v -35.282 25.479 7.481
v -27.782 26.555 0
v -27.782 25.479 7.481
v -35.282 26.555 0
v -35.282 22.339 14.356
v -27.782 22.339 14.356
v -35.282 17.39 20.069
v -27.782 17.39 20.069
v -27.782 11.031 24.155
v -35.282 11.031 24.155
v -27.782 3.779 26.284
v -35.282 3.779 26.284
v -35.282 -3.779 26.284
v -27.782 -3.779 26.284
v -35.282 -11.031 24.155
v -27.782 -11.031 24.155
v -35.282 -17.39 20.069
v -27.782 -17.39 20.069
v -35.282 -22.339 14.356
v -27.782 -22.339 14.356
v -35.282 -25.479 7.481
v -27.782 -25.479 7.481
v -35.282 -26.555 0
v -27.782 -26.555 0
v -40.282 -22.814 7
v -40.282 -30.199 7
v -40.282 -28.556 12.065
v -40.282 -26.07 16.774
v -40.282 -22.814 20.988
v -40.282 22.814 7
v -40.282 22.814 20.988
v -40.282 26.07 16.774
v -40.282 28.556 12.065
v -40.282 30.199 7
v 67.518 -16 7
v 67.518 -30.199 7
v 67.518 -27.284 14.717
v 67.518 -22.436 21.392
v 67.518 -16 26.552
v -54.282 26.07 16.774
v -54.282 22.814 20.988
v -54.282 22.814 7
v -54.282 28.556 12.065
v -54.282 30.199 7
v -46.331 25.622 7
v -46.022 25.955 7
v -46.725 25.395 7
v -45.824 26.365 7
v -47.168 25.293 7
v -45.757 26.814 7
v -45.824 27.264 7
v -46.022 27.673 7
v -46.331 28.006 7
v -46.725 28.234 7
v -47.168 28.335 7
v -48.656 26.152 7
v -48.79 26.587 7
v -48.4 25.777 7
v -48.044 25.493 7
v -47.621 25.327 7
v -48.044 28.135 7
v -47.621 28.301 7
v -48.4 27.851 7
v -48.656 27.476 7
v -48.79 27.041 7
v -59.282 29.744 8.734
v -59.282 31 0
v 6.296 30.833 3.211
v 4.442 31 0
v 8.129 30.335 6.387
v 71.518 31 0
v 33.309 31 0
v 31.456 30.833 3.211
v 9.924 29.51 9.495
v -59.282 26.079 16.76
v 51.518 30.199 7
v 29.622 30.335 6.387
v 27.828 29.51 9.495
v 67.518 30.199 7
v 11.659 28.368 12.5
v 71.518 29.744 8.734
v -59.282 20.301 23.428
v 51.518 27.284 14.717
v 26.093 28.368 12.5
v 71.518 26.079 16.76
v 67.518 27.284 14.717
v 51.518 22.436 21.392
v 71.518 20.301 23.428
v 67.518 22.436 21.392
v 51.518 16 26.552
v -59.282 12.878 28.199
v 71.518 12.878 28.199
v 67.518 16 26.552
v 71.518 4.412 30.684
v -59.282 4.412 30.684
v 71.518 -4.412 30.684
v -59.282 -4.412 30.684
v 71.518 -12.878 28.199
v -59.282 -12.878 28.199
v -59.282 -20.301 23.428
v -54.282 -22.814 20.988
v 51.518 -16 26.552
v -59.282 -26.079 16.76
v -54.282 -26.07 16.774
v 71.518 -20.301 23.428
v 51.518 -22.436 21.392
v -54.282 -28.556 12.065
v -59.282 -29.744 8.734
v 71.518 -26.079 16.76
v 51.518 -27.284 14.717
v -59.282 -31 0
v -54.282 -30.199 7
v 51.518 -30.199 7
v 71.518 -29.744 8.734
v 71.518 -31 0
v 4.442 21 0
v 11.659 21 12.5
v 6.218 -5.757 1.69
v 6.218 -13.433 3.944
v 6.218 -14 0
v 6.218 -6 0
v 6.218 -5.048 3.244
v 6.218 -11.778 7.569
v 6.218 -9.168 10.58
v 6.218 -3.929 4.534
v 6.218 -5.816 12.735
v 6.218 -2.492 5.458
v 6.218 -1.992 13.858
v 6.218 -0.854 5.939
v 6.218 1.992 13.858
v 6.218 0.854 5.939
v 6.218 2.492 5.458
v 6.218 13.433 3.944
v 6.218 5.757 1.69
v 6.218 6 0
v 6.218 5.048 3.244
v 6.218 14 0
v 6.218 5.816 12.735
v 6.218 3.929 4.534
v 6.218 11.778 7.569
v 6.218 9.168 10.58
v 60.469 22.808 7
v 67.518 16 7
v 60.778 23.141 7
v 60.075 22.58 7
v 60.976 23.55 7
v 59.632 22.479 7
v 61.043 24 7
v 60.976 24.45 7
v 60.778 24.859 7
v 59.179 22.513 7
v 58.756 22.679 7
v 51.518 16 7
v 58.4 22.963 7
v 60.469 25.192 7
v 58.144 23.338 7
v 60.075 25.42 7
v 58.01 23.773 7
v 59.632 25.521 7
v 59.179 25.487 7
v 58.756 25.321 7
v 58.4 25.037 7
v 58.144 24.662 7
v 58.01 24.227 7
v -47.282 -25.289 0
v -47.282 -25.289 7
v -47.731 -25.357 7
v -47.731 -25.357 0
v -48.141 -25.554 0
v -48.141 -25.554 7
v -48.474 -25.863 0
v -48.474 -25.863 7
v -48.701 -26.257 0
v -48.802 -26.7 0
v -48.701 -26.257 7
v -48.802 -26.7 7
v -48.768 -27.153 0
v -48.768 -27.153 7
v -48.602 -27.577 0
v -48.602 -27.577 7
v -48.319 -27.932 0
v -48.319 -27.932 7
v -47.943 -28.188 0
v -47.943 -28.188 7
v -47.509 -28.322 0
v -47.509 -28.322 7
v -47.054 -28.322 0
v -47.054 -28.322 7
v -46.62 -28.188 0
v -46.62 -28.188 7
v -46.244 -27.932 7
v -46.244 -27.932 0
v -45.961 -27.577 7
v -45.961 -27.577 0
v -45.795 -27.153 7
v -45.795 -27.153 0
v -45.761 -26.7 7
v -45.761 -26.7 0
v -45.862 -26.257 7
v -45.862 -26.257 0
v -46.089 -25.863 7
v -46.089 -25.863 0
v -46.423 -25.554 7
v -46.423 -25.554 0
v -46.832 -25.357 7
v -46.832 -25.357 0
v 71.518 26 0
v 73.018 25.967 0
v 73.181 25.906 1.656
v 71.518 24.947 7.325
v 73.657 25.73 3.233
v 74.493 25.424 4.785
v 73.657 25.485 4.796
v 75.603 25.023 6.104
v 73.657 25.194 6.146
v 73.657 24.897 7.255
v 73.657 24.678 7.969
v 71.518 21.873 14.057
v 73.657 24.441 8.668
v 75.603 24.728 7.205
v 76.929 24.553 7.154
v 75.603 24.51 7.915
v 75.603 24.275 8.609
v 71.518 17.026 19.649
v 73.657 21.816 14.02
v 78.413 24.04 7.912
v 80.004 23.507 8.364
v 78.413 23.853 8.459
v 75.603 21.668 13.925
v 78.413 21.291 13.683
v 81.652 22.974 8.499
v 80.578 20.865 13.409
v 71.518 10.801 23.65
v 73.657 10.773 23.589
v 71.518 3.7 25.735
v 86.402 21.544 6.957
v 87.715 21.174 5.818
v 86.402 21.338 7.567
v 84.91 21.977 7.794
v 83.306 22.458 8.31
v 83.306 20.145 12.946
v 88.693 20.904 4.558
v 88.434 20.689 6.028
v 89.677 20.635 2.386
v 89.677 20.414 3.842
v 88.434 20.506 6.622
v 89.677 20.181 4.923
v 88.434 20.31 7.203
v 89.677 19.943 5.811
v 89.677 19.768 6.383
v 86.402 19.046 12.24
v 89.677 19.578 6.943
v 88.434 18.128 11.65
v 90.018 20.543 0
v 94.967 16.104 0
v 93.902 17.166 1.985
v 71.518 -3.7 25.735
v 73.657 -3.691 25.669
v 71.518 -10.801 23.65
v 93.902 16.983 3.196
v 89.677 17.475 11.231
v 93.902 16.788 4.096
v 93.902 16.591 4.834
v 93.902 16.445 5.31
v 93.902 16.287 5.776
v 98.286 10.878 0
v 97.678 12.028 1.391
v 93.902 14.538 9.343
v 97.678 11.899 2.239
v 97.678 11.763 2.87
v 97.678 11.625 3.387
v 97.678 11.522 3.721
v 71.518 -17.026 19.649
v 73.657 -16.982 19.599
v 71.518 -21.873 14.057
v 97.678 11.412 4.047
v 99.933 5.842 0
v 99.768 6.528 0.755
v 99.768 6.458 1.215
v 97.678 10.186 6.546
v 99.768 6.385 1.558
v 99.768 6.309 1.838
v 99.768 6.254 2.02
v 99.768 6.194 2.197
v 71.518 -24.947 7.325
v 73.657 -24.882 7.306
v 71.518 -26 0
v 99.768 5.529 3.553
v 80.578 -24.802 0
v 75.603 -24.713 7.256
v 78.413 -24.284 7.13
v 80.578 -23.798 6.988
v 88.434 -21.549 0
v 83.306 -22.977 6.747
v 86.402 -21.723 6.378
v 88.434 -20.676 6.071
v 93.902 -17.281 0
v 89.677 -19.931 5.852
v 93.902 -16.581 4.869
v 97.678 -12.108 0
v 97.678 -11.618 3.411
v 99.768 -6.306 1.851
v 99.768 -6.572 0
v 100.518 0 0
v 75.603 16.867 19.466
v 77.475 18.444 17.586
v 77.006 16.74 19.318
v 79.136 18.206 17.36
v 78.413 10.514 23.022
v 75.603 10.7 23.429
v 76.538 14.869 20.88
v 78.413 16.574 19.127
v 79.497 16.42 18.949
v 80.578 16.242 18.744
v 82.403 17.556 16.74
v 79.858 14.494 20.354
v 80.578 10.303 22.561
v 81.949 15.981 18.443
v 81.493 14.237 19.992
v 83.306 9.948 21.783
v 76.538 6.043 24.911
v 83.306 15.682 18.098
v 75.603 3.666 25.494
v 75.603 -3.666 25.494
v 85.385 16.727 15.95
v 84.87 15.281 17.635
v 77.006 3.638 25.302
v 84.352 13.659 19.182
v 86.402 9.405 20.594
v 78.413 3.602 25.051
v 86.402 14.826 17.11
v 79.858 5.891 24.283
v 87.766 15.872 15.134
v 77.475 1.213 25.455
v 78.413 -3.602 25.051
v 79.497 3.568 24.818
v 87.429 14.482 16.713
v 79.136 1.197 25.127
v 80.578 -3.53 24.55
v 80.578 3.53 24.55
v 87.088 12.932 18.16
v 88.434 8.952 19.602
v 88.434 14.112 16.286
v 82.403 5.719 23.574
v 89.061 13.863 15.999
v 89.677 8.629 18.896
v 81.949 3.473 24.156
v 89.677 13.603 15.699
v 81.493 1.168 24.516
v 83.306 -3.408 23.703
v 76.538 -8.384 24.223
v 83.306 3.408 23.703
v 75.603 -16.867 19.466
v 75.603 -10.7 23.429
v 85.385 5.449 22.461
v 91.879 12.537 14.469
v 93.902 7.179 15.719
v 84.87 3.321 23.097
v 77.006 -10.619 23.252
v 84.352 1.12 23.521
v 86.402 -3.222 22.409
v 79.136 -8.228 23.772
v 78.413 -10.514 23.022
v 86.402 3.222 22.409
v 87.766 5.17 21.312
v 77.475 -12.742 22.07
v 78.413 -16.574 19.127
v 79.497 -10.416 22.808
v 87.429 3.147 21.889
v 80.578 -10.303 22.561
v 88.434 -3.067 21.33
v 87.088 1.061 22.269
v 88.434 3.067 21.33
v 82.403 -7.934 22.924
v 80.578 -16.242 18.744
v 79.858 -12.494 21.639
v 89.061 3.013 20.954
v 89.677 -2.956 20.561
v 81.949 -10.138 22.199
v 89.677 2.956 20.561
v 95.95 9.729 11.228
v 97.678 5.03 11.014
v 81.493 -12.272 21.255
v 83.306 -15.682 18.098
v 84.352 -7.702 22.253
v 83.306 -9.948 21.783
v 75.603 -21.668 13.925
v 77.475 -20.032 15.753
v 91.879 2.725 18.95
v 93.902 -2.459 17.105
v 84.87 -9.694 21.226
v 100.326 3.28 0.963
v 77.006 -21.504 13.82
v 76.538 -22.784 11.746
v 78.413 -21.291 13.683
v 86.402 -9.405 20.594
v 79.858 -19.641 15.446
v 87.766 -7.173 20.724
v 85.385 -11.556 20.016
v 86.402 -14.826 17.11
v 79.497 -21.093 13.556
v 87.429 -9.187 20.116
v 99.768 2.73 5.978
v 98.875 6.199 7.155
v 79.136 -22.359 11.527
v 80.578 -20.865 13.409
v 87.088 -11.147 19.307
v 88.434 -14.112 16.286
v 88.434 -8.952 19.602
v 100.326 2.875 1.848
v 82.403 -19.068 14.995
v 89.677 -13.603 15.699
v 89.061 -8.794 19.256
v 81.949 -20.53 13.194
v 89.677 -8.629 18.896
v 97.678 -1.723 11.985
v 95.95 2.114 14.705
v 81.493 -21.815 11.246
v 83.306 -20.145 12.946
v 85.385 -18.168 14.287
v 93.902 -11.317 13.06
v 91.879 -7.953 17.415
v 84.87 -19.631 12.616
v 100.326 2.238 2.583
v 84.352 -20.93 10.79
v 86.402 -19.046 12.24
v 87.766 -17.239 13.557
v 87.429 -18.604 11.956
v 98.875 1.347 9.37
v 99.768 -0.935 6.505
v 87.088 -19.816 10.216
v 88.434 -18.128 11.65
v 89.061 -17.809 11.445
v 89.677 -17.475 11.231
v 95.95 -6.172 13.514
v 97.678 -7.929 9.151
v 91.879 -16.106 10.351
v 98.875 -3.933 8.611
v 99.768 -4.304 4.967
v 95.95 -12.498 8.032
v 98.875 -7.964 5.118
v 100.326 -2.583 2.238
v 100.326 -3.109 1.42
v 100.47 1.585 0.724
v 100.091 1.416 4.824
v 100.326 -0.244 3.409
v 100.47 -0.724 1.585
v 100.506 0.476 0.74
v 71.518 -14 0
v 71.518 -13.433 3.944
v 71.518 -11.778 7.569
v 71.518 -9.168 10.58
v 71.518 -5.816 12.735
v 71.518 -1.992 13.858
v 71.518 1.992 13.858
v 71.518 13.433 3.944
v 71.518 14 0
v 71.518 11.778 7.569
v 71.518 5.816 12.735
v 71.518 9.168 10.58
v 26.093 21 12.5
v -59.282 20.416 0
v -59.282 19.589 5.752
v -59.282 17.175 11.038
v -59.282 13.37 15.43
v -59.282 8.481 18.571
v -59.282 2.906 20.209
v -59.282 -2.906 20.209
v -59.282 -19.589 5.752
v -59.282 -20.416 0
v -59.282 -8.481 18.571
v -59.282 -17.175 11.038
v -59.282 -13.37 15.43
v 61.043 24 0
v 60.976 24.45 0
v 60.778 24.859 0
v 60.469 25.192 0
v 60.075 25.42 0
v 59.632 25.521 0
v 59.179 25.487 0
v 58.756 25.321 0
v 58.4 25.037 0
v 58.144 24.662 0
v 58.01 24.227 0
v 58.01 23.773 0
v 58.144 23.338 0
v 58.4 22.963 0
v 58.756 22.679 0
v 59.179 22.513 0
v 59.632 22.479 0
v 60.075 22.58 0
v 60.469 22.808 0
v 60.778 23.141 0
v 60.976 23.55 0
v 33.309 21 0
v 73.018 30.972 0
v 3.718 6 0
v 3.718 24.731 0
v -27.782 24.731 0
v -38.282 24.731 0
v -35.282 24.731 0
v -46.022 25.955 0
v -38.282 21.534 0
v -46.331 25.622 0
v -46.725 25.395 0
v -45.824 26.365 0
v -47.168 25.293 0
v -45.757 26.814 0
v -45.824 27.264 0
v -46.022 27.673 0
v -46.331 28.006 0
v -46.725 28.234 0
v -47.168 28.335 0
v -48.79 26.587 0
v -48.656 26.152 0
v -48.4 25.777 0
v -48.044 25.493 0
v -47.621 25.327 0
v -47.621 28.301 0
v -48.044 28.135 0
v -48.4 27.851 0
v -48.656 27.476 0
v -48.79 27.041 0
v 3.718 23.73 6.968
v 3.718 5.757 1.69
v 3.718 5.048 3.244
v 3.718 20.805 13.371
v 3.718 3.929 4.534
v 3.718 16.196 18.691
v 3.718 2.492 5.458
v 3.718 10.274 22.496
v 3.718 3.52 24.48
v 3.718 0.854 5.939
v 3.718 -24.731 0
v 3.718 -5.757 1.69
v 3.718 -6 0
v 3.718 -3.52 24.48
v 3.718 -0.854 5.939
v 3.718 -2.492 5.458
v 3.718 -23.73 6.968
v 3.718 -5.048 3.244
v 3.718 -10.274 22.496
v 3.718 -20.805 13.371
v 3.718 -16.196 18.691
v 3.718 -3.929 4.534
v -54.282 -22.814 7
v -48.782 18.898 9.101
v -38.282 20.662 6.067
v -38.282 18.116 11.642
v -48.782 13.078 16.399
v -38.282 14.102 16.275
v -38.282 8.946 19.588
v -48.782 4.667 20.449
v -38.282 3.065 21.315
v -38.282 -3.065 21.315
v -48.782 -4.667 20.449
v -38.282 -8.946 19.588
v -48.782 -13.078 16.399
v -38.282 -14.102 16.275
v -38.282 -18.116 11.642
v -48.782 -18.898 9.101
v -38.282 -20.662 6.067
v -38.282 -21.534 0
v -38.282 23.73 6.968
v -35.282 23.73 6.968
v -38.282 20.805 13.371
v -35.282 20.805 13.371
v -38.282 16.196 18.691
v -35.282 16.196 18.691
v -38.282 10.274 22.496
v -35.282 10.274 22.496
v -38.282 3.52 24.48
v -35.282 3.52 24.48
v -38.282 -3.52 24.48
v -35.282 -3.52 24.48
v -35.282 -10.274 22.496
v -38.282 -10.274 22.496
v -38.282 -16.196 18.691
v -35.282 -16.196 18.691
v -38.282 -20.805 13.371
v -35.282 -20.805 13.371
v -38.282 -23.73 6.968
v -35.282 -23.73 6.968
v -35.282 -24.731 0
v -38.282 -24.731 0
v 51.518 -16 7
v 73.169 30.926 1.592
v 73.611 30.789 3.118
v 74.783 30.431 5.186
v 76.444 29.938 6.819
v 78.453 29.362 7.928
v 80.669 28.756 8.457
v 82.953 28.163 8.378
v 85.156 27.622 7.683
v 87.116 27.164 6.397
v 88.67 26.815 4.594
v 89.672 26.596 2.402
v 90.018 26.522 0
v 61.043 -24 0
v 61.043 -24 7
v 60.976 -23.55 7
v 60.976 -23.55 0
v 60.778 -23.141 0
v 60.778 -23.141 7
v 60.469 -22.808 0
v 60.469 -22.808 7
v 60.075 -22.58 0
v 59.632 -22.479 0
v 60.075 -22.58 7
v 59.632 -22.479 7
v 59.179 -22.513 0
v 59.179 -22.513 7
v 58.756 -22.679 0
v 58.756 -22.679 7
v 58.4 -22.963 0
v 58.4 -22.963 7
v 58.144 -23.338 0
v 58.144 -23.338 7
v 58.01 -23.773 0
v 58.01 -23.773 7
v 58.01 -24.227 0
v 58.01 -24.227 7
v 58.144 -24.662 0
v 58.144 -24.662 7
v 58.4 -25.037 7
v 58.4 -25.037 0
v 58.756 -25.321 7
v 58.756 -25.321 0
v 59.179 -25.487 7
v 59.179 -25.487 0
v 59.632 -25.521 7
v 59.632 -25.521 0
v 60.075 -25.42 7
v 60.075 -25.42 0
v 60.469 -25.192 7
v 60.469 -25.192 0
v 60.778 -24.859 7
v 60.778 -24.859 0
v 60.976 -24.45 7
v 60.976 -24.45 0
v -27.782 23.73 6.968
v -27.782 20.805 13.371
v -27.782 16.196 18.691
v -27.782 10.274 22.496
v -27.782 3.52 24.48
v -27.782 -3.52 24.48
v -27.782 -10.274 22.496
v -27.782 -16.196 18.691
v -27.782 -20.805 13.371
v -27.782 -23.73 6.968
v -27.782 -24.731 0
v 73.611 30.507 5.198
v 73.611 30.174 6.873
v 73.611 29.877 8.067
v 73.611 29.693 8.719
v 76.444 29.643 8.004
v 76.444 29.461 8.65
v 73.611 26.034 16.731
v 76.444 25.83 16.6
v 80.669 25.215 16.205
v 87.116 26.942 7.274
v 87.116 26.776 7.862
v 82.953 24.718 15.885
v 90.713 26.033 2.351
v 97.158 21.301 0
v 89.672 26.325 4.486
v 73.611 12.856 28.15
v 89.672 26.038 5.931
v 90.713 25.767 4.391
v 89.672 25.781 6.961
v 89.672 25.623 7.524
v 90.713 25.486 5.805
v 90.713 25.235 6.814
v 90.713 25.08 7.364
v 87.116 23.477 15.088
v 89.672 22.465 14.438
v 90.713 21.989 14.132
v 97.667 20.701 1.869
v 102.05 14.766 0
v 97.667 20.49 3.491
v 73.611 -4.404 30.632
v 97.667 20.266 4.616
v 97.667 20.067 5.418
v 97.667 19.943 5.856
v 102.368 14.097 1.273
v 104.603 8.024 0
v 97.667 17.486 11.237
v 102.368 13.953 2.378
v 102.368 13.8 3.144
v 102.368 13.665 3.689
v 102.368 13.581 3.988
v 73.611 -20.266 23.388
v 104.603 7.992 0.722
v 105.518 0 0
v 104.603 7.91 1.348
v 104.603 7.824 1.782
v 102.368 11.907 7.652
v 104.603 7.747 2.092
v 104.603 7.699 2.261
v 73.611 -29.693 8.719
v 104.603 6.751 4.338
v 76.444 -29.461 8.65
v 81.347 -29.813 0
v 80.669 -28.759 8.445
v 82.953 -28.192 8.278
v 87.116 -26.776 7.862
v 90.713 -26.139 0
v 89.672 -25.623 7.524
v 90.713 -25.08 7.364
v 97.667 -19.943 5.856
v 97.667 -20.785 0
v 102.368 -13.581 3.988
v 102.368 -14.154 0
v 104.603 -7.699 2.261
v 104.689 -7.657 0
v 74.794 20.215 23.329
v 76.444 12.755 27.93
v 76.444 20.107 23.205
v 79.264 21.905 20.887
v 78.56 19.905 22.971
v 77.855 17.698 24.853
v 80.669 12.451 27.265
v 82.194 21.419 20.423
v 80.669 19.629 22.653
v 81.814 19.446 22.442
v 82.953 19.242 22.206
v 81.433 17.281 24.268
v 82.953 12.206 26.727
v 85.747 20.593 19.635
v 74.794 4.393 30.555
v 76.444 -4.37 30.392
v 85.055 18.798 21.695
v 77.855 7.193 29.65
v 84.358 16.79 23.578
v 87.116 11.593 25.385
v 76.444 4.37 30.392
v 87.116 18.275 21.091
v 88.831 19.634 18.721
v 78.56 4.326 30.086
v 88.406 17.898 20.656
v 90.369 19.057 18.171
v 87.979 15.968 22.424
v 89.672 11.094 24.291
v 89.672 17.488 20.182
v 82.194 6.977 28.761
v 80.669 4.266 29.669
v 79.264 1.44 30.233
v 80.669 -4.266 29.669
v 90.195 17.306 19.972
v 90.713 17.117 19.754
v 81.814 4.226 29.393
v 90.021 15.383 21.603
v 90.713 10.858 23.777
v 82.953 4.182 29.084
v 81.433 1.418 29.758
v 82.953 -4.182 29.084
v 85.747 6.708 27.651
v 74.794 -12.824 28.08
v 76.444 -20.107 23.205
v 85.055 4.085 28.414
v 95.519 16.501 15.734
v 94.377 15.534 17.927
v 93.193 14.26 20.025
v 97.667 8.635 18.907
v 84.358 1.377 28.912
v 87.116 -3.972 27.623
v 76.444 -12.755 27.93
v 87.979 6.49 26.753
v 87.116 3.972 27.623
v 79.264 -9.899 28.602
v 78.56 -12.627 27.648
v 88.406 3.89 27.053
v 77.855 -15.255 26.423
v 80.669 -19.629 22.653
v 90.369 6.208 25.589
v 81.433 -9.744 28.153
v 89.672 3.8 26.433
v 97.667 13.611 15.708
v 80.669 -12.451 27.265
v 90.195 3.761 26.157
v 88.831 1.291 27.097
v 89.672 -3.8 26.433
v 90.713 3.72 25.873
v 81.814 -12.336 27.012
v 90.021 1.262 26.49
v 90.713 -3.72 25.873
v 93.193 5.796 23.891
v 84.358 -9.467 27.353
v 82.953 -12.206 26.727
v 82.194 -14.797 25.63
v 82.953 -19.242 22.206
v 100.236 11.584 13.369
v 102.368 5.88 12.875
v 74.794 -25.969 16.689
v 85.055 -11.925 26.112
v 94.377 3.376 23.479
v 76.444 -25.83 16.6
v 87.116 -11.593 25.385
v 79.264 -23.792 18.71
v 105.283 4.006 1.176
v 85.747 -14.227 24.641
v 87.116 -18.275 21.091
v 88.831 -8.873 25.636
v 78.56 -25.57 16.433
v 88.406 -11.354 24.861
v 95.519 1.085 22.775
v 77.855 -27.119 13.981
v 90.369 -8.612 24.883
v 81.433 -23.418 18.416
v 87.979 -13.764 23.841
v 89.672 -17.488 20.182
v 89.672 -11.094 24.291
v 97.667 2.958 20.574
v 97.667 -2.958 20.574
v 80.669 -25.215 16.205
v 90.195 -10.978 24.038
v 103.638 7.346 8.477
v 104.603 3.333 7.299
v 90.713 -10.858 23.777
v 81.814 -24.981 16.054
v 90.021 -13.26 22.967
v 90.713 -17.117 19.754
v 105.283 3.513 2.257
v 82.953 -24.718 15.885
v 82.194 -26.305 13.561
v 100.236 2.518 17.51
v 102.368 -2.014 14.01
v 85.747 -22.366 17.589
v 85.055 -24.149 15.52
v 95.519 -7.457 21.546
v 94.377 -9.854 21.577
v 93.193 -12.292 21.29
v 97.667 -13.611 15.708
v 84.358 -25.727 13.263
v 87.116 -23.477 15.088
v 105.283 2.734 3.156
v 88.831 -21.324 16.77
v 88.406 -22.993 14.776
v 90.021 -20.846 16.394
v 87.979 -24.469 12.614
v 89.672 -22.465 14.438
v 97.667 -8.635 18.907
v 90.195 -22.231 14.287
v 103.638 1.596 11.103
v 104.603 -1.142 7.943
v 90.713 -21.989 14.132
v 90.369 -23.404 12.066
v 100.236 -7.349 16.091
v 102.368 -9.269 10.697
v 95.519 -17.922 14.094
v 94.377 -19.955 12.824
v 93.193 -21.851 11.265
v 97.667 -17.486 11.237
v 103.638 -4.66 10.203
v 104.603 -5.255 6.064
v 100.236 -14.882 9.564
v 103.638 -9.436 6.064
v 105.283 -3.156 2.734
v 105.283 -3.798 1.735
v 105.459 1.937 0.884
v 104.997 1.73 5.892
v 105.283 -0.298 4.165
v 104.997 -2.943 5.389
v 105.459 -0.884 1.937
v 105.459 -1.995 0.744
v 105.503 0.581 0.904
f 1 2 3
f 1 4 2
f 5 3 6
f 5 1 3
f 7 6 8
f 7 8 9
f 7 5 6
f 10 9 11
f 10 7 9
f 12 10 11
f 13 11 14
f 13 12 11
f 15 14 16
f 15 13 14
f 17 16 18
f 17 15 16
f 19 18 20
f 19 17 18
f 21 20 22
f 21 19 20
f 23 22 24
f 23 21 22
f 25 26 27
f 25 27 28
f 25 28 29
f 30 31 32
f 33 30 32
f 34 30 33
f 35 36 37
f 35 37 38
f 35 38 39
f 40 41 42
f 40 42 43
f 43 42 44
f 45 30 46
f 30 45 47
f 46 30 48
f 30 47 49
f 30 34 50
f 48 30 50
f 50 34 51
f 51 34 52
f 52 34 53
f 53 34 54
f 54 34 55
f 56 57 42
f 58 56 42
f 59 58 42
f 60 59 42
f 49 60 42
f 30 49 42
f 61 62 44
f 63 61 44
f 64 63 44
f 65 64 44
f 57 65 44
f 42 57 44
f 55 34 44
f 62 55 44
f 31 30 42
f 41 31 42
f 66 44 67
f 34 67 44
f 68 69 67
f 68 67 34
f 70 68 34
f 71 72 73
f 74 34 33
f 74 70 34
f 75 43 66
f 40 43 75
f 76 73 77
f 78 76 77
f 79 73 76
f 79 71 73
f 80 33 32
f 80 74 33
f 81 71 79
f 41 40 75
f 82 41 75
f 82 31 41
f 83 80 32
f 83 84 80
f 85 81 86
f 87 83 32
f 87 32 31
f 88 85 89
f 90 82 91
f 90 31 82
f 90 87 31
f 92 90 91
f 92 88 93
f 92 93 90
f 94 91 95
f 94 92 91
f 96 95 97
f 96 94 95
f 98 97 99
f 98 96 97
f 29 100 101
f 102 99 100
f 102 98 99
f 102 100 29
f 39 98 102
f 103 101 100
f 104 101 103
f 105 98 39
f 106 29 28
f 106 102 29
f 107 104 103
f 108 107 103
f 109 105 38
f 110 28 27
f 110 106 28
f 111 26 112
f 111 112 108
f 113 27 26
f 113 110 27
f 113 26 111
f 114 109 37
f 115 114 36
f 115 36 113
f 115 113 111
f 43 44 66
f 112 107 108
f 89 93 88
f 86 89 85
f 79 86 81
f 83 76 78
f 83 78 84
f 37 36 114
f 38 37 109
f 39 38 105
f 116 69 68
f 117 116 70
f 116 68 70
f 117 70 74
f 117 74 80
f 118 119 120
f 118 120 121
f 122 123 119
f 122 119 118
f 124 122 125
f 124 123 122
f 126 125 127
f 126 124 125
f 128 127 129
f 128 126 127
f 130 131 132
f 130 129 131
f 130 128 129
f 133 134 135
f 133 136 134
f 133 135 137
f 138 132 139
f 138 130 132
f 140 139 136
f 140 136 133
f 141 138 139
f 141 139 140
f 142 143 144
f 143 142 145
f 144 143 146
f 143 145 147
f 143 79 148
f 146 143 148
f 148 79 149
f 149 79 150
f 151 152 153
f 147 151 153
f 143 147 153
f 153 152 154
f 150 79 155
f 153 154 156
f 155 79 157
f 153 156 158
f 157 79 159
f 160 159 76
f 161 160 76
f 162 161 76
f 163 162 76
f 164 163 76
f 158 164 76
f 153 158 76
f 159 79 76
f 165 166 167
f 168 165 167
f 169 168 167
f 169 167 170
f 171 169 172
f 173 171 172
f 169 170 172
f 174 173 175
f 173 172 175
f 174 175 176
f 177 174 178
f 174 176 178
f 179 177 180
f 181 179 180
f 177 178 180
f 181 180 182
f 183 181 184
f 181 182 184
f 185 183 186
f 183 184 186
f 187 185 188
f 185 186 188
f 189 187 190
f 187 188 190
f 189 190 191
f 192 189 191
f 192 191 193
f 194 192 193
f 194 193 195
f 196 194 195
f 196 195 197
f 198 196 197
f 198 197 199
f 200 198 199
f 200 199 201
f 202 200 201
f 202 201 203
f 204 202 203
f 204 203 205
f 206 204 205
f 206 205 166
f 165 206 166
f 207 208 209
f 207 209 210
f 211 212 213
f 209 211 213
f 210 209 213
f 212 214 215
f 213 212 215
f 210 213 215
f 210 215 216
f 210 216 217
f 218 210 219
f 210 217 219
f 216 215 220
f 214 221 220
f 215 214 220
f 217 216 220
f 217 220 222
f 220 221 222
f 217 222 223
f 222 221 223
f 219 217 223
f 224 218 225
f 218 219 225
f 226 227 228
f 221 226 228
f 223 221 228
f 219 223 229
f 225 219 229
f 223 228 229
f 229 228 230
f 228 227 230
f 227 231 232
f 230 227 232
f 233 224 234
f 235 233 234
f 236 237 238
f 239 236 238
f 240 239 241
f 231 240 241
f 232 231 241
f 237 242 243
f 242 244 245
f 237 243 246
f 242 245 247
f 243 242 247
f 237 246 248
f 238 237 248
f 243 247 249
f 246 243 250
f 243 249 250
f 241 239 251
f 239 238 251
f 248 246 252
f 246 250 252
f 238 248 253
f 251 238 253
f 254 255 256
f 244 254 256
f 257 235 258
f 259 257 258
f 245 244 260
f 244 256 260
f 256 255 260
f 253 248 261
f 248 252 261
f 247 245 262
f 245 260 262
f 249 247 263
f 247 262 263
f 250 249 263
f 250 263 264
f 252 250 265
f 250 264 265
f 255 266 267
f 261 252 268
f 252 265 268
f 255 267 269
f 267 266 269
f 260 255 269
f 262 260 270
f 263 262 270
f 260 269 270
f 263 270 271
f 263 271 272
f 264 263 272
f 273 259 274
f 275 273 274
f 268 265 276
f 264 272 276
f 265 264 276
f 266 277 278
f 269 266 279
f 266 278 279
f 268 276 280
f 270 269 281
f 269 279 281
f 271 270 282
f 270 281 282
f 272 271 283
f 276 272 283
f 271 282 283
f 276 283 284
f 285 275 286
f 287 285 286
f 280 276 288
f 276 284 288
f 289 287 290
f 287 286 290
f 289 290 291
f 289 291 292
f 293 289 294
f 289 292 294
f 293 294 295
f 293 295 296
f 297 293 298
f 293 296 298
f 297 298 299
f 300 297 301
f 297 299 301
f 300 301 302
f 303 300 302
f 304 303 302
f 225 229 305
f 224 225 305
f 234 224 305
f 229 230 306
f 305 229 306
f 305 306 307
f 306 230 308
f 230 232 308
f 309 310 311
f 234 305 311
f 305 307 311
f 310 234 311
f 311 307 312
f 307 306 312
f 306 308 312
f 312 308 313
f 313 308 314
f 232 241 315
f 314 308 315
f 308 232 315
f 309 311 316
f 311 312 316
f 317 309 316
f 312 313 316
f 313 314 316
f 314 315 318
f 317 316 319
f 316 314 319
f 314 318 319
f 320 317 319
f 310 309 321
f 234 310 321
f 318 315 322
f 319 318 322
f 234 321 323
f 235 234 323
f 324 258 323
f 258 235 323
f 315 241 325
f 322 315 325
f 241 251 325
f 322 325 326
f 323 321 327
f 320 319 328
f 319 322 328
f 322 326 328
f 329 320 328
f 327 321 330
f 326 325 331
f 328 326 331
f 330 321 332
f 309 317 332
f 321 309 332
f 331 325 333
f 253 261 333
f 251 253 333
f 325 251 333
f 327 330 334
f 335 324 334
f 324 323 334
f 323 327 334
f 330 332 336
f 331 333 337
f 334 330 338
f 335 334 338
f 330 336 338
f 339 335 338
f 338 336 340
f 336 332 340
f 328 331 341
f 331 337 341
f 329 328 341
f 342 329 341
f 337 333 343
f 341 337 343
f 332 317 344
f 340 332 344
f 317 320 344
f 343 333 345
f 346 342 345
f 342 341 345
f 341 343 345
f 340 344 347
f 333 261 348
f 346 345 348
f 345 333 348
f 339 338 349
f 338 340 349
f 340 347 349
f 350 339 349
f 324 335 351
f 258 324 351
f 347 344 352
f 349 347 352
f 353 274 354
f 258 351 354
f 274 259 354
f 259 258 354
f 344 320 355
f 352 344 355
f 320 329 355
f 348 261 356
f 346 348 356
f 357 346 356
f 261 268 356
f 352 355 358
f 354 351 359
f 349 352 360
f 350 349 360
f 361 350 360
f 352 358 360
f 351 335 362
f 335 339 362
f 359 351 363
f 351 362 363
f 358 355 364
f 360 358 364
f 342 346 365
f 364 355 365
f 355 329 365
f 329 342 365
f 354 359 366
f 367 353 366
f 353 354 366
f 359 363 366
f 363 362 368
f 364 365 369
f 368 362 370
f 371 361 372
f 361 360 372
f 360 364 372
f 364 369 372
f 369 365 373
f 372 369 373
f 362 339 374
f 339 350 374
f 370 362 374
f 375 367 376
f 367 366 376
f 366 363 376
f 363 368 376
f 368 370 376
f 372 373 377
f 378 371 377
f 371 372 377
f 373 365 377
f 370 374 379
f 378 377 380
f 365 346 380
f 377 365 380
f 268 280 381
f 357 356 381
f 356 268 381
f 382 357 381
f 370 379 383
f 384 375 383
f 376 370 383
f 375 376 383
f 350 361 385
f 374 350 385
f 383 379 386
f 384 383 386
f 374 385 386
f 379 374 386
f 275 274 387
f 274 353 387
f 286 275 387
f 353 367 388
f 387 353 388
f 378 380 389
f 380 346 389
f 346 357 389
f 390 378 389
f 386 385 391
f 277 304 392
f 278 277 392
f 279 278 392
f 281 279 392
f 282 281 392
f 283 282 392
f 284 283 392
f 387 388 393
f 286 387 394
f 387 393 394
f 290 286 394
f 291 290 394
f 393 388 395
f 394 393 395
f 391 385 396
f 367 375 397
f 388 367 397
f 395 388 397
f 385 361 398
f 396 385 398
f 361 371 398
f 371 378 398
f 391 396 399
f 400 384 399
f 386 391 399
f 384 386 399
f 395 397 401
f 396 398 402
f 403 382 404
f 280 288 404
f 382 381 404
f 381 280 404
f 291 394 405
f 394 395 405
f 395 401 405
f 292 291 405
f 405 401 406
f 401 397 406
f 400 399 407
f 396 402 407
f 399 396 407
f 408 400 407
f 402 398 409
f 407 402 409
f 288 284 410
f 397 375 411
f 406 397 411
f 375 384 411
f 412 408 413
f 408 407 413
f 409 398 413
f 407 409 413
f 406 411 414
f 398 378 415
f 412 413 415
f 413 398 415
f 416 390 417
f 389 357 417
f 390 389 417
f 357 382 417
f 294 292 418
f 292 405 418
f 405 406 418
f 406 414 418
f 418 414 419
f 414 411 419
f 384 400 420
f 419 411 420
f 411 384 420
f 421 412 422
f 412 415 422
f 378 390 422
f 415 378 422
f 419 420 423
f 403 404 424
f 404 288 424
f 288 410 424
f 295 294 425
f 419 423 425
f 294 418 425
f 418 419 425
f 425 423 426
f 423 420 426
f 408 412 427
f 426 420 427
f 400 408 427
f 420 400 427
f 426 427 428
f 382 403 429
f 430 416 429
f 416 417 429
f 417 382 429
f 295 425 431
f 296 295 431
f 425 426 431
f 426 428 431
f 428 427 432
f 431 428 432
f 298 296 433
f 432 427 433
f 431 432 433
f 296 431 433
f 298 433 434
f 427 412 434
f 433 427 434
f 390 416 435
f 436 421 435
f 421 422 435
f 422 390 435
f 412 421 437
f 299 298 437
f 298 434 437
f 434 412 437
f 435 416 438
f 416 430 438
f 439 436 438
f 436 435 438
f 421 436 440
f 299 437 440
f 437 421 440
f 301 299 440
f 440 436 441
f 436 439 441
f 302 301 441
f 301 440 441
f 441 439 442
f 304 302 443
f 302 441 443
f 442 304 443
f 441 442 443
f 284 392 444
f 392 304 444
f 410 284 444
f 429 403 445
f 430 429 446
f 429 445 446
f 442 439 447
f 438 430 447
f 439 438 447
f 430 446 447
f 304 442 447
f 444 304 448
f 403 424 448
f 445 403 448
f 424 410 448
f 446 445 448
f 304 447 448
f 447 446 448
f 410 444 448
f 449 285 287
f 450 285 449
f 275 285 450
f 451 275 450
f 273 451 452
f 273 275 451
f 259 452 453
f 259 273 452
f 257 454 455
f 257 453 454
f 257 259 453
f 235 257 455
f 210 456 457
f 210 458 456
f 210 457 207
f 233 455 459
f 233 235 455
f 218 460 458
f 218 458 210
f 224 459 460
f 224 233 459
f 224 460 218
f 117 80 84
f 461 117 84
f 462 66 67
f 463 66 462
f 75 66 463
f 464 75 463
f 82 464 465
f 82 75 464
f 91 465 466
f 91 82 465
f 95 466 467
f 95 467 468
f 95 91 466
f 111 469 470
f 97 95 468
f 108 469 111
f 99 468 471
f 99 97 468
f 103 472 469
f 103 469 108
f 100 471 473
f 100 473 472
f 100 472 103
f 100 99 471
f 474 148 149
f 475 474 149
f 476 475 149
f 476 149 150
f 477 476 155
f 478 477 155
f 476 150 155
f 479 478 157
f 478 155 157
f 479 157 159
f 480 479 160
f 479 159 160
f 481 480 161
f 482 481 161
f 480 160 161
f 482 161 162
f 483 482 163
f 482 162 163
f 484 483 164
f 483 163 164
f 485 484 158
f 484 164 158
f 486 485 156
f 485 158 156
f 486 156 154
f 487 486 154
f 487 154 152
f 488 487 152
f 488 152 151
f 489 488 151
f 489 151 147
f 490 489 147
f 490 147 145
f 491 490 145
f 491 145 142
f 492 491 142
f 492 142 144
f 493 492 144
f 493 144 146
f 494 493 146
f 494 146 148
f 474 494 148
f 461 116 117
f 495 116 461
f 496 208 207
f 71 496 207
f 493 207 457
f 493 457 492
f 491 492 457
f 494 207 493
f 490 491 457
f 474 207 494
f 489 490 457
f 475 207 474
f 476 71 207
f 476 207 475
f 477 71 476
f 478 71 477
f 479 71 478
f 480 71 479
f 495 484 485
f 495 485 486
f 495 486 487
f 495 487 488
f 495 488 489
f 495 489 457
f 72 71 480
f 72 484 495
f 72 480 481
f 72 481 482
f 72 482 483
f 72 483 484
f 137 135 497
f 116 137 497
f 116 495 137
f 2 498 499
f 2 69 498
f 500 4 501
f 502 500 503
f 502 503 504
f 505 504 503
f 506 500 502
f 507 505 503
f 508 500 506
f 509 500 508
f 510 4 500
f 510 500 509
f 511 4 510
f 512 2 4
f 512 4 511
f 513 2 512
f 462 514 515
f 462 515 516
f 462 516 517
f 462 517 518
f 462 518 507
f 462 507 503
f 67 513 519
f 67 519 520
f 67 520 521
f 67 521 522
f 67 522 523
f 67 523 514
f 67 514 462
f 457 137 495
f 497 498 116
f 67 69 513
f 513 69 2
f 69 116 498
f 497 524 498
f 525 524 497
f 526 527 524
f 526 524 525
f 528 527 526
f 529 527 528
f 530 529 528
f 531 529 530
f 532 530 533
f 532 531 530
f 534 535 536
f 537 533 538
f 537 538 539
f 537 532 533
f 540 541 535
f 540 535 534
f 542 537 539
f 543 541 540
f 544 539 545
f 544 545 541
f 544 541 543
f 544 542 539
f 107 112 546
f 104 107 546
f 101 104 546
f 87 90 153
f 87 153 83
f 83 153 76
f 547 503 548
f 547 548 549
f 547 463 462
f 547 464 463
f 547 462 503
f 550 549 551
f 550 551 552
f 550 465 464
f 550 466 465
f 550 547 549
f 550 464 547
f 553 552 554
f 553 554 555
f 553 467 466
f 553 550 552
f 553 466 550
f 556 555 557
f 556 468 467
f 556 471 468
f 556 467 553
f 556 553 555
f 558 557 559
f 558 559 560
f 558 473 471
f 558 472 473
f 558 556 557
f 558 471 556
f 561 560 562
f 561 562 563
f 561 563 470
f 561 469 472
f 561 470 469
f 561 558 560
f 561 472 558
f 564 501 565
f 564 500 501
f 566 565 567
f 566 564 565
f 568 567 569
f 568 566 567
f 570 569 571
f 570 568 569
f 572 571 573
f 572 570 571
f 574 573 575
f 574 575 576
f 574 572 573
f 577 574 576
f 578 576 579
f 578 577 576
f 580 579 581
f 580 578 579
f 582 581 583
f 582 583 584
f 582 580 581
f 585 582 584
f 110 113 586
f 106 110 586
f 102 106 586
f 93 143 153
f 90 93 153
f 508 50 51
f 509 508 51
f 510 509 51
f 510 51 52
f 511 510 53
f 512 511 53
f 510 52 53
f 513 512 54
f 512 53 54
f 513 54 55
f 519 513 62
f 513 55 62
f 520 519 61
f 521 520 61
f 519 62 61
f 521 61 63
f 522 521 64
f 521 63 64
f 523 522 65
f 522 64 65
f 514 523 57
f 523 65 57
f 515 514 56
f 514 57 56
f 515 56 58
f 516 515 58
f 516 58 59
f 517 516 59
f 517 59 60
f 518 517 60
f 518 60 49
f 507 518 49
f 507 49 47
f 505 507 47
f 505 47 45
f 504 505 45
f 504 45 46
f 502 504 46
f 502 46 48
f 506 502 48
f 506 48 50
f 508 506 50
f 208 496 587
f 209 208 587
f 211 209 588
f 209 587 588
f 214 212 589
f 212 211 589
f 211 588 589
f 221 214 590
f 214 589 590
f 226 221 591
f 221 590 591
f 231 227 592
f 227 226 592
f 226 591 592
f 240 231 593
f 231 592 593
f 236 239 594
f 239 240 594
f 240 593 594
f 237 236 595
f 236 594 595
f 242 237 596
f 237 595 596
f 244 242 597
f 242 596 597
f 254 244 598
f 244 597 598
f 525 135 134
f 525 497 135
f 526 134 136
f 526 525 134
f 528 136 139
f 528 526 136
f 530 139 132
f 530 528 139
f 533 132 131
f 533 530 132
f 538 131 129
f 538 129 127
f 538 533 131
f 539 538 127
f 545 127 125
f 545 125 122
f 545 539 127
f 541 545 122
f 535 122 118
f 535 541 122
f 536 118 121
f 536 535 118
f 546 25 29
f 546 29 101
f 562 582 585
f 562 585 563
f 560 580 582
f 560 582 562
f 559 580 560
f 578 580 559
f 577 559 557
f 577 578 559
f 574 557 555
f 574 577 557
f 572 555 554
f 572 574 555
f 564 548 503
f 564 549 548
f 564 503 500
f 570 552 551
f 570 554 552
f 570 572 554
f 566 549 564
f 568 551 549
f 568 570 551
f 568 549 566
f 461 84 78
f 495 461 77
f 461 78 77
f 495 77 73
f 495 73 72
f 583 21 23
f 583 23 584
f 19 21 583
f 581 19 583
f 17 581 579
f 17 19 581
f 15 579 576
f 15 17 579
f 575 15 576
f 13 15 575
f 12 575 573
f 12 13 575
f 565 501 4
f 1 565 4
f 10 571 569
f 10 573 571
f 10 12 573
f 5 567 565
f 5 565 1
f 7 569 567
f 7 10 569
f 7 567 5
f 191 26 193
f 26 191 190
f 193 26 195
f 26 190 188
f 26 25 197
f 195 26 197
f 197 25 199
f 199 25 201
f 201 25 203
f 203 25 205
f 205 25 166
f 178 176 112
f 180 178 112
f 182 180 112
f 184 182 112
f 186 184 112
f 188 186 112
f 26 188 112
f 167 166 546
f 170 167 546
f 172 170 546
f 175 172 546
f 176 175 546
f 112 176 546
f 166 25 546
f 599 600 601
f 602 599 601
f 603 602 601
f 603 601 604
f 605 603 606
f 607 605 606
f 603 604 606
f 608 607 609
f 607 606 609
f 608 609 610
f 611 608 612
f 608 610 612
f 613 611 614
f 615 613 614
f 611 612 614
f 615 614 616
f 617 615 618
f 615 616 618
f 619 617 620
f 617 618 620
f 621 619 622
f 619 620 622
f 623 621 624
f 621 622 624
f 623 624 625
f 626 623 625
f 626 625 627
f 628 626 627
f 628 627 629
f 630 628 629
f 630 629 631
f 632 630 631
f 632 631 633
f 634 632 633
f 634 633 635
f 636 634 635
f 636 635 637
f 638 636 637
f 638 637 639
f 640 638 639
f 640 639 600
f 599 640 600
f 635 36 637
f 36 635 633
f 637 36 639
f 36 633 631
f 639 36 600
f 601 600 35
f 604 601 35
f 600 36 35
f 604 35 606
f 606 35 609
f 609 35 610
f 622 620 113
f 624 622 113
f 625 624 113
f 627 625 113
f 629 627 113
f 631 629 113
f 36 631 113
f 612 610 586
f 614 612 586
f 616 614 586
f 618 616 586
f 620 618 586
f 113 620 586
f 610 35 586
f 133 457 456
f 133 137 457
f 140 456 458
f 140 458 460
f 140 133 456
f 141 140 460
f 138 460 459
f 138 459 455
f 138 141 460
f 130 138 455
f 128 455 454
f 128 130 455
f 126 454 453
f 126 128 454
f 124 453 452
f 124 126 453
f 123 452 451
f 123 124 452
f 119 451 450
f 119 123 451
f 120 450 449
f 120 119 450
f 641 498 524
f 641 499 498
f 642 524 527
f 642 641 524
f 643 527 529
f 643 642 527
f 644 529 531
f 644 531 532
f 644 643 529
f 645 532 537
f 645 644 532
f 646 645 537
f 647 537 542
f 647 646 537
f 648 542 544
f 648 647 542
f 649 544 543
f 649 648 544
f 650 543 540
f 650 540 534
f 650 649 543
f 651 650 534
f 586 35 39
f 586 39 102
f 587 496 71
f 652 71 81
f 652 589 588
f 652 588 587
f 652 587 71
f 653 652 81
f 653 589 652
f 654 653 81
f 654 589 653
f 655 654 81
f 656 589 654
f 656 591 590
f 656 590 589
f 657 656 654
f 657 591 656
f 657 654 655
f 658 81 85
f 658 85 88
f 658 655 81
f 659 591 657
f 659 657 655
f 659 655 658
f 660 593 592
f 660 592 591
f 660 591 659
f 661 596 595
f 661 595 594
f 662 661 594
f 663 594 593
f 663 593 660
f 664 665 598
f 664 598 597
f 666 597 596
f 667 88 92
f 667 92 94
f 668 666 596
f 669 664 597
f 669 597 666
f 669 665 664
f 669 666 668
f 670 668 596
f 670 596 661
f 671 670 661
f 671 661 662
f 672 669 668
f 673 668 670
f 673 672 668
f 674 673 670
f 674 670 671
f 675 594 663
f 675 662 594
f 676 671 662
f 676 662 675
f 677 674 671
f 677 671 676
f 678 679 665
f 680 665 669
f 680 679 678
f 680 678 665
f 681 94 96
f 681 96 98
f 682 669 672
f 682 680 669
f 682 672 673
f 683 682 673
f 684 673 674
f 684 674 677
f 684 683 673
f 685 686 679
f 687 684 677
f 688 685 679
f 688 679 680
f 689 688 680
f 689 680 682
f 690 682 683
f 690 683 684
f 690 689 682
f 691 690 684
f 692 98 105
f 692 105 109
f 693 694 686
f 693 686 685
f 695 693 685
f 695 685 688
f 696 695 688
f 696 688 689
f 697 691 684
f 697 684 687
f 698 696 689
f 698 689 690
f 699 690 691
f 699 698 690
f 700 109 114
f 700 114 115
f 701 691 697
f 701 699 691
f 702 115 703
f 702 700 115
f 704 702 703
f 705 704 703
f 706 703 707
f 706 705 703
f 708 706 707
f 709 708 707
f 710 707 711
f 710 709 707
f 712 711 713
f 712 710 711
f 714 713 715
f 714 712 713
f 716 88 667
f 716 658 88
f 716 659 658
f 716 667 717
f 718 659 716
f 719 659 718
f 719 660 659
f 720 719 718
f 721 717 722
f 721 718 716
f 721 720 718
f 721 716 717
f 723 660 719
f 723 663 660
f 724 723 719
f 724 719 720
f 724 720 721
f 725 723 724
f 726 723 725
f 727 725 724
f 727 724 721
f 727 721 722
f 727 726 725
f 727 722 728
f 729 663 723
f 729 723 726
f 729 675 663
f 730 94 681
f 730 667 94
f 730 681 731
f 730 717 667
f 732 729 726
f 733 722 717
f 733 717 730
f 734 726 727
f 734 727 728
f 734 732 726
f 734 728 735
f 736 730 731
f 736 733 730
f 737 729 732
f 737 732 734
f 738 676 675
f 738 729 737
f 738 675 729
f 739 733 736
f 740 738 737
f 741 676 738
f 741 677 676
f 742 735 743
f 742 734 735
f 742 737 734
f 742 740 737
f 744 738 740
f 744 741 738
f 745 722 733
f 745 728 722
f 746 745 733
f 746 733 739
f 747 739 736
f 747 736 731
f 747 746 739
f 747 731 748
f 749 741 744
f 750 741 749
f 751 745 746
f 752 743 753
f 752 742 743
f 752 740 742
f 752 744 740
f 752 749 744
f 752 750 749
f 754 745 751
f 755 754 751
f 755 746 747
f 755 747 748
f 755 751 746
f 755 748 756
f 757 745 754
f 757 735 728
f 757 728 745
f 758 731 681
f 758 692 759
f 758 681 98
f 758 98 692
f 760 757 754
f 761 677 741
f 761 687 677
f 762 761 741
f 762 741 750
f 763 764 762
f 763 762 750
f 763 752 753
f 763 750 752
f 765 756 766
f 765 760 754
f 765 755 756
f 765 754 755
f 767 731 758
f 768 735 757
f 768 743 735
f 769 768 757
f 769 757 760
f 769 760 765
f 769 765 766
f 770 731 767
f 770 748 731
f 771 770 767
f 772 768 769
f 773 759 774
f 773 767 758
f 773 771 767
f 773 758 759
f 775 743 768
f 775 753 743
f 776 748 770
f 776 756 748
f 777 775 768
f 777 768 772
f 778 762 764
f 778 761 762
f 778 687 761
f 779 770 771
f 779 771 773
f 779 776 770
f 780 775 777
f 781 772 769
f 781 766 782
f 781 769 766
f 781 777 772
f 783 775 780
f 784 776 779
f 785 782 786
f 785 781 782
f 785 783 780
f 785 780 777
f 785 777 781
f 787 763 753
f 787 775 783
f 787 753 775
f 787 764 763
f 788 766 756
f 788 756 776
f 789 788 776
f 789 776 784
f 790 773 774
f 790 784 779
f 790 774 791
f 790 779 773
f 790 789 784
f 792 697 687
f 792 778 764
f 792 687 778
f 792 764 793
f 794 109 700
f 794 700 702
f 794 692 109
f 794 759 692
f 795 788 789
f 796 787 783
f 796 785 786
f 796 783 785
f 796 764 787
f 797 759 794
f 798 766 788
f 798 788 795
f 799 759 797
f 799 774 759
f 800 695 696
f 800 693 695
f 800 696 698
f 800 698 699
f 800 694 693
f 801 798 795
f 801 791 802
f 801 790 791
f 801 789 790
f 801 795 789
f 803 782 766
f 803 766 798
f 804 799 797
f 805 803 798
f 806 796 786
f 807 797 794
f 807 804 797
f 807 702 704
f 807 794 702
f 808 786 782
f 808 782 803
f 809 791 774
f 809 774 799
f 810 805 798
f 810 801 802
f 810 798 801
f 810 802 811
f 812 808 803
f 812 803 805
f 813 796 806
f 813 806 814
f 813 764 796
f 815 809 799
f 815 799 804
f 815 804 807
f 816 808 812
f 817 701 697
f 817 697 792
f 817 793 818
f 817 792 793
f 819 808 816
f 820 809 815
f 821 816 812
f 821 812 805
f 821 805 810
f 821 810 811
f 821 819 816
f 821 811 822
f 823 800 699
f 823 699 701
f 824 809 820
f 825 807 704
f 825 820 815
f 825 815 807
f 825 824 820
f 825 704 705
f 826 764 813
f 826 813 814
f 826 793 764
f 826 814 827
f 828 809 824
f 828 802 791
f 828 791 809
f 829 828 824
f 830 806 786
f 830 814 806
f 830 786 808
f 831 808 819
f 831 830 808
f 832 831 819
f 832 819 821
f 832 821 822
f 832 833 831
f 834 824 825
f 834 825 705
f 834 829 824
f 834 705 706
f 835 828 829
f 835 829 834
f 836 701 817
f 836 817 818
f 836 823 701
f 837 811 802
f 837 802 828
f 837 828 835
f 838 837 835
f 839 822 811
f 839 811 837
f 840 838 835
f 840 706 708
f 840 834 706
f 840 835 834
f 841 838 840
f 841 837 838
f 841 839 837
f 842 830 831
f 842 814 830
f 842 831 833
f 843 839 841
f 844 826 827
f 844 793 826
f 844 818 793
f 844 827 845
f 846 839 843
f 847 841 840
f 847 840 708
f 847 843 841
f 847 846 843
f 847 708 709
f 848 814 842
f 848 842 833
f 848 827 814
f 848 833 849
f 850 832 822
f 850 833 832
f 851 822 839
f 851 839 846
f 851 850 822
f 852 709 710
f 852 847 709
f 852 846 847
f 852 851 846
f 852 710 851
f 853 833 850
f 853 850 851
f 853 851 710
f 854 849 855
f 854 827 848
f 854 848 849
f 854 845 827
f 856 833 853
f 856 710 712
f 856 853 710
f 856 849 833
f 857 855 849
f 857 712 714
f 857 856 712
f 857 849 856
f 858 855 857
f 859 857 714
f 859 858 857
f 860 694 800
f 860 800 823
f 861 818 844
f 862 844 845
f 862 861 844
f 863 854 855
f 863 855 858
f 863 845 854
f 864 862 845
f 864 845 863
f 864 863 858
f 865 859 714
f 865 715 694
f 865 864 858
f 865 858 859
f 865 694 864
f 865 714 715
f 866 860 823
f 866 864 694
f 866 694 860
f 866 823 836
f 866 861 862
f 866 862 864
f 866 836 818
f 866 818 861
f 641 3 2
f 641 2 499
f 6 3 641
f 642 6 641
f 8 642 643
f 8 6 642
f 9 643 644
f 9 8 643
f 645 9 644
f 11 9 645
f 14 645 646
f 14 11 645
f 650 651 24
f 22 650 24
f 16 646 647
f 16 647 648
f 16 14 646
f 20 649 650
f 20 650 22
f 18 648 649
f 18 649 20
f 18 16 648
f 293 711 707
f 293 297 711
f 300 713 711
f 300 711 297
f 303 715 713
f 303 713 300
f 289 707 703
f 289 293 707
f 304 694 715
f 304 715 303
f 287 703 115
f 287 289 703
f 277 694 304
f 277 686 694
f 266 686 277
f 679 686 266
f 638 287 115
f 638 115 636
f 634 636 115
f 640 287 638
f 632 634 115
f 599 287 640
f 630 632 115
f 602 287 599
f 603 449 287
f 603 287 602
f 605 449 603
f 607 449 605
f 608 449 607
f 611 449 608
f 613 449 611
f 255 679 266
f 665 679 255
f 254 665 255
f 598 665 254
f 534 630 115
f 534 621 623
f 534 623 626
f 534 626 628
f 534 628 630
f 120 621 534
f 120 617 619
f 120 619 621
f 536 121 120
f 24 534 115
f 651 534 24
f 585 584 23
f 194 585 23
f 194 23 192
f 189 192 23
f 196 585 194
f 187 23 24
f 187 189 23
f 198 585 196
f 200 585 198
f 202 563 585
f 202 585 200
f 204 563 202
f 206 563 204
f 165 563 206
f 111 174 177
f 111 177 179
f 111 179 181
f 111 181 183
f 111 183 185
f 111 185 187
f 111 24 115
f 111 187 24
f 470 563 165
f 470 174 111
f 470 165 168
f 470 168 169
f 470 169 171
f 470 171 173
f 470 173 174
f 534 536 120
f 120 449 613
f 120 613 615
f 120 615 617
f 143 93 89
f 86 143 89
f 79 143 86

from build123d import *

# Parameters (mm, degrees)
REVOLVE1_ANGLE          = 180
CUT_EXTRUDE1_REACH      = 114.566
CUT_EXTRUDE1_END_RADIUS = 31
SKETCH2_W               = 14
SKETCH2_H               = 8.185848791
SKETCH2_W_2             = 16
SKETCH2_H_2             = 15
CUT_EXTRUDE2_REACH      = 114.566
SKETCH3_R               = 1.525
CUT_EXTRUDE3_DEPTH      = 10
CUT_EXTRUDE4_REACH      = 128.25
SKETCH6_R               = 8.5


with BuildPart() as part:
    # Sketch1 → Revolve1 (revolve)
    with BuildSketch(Plane.XY):
        with BuildLine():
            Line((6.218316837, 14), (6.218316837, 6))
            Line((6.218316837, 6), (3.718316837, 6))
            Line((3.718316837, 6), (3.718316837, 24.731367941))
            Line((3.718316837, 24.731367941), (-10.171408573, 24.731367941))
            Line((-10.171408573, 24.731367941), (-27.781683163, 24.731367941))
            Line((-27.781683163, 24.731367941), (-27.781683163, 26.554502519))
            Line((-27.781683163, 26.554502519), (-35.281683163, 26.554502519))
            Line((-35.281683163, 26.554502519), (-35.281683163, 24.731367941))
            Line((-35.281683163, 24.731367941), (-38.281683163, 24.731367941))
            Line((-38.281683163, 24.731367941), (-38.281683163, 21.534346957))
            Line((-38.281683163, 21.534346957), (-59.281683163, 20.416426404))
            Line((-59.281683163, 20.416426404), (-59.281683163, 24.731367941))
            Line((-59.281683163, 24.731367941), (-59.281683163, 31))
            Line((-59.281683163, 31), (-56.981683163, 31))
            Line((-56.981683163, 31), (71.518316837, 31))
            add(Edge.make_bspline(
                [(71.518316837, 31), (87.336893309, 31), (105.518316837, 21.771712161), (105.518316837, 0)],
                knots=[0, 0, 0, 0, 1, 1, 1, 1], degree=3))
            Line((105.518316837, 0), (100.518316813, 0))
            add(Edge.make_bspline(
                [(71.518316837, 26), (84.501211561, 26), (100.518316813, 18.460024777), (100.518316813, 0)],
                knots=[0, 0, 0, 0, 1, 1, 1, 1], degree=3))
            Line((71.518316837, 26), (71.518316837, 14))
            Line((71.518316837, 14), (6.218316837, 14))
        make_face()
    revolve(axis=Axis((-52.937293729, 0, 0), (1, 0, 0)), revolution_arc=REVOLVE1_ANGLE)

    # Cut-Extrude1: up to this cylinder (the profile starts inside it)
    cut_extrude1_end = Plane(origin=(6.118317, 0, 0), z_dir=(-1, 0, 0)) * Cylinder(CUT_EXTRUDE1_END_RADIUS, 398.932, mode=Mode.PRIVATE)
    # Sketch2 → Cut-Extrude1 (cut, up to the surface)
    with BuildSketch(Plane(origin=(0, 0, 7), x_dir=(-1, 0, 0), z_dir=(0, 0, -1)), mode=Mode.PRIVATE) as cut_extrude1_sk1:
        with Locations((47.281683163, 26.907075605)):
            Rectangle(SKETCH2_W, SKETCH2_H)
    cut_extrude1_tool1 = extrude(cut_extrude1_sk1.sketch, amount=-CUT_EXTRUDE1_REACH, mode=Mode.PRIVATE) & cut_extrude1_end
    add(cut_extrude1_tool1.solids().sort_by_distance((-47.281683, 26.907076, 7))[0], mode=Mode.SUBTRACT)
    # Sketch2 → Cut-Extrude1 (cut, up to the surface)
    with BuildSketch(Plane(origin=(0, 0, 7), x_dir=(-1, 0, 0), z_dir=(0, 0, -1)), mode=Mode.PRIVATE) as cut_extrude1_sk2:
        with Locations((-59.518316837, -23.5)):
            Rectangle(SKETCH2_W_2, SKETCH2_H_2)
    cut_extrude1_tool2 = extrude(cut_extrude1_sk2.sketch, amount=-CUT_EXTRUDE1_REACH, mode=Mode.PRIVATE) & cut_extrude1_end
    add(cut_extrude1_tool2.solids().sort_by_distance((59.518317, -23.5, 7))[0], mode=Mode.SUBTRACT)
    # Sketch2 → Cut-Extrude1 (cut, up to the surface)
    with BuildSketch(Plane(origin=(0, 0, 7), x_dir=(-1, 0, 0), z_dir=(0, 0, -1)), mode=Mode.PRIVATE) as cut_extrude1_sk3:
        with Locations((-59.518316837, 23.5)):
            Rectangle(SKETCH2_W_2, SKETCH2_H_2)
    cut_extrude1_tool3 = extrude(cut_extrude1_sk3.sketch, amount=-CUT_EXTRUDE1_REACH, mode=Mode.PRIVATE) & cut_extrude1_end
    add(cut_extrude1_tool3.solids().sort_by_distance((59.518317, 23.5, 7))[0], mode=Mode.SUBTRACT)
    # Sketch2 → Cut-Extrude1 (cut, up to the surface)
    with BuildSketch(Plane(origin=(0, 0, 7), x_dir=(-1, 0, 0), z_dir=(0, 0, -1)), mode=Mode.PRIVATE) as cut_extrude1_sk4:
        with Locations((47.281683163, -26.907075605)):
            Rectangle(SKETCH2_W, SKETCH2_H)
    cut_extrude1_tool4 = extrude(cut_extrude1_sk4.sketch, amount=-CUT_EXTRUDE1_REACH, mode=Mode.PRIVATE) & cut_extrude1_end
    add(cut_extrude1_tool4.solids().sort_by_distance((-47.281683, -26.907076, 7))[0], mode=Mode.SUBTRACT)

    # Sketch3 → Cut-Extrude2 (cut, up to next)
    with BuildSketch(Plane.XY.offset(7), mode=Mode.PRIVATE) as cut_extrude2_sk1:
        with Locations((-47.281683163, 26.814151209)):
            Circle(SKETCH3_R)
    cut_extrude2_tool1 = extrude(cut_extrude2_sk1.sketch, amount=-CUT_EXTRUDE2_REACH, mode=Mode.PRIVATE) & part.part
    # Sketch3 → Cut-Extrude2 (cut, up to next)
    with BuildSketch(Plane.XY.offset(7), mode=Mode.PRIVATE) as cut_extrude2_sk2:
        with Locations(Location((-47.281683163, -26.814151209, 0), (0, 0, 90))):
            Circle(SKETCH3_R)
    cut_extrude2_tool2 = extrude(cut_extrude2_sk2.sketch, amount=-CUT_EXTRUDE2_REACH, mode=Mode.PRIVATE) & part.part
    # Sketch3 → Cut-Extrude2 (cut, up to next)
    with BuildSketch(Plane.XY.offset(7), mode=Mode.PRIVATE) as cut_extrude2_sk3:
        with Locations((59.518316837, 24)):
            Circle(SKETCH3_R)
    cut_extrude2_tool3 = extrude(cut_extrude2_sk3.sketch, amount=-CUT_EXTRUDE2_REACH, mode=Mode.PRIVATE) & part.part
    # Sketch3 → Cut-Extrude2 (cut, up to next)
    with BuildSketch(Plane.XY.offset(7), mode=Mode.PRIVATE) as cut_extrude2_sk4:
        with Locations((59.518316837, -24)):
            Circle(SKETCH3_R)
    cut_extrude2_tool4 = extrude(cut_extrude2_sk4.sketch, amount=-CUT_EXTRUDE2_REACH, mode=Mode.PRIVATE) & part.part
    add(cut_extrude2_tool1.solids().sort_by_distance((-47.281683, 26.814151, 7))[0], mode=Mode.SUBTRACT)
    add(cut_extrude2_tool2.solids().sort_by_distance((-47.281683, -26.814151, 7))[0], mode=Mode.SUBTRACT)
    add(cut_extrude2_tool3.solids().sort_by_distance((59.518317, 24, 7))[0], mode=Mode.SUBTRACT)
    add(cut_extrude2_tool4.solids().sort_by_distance((59.518317, -24, 7))[0], mode=Mode.SUBTRACT)

    # Sketch5 → Cut-Extrude3 (cut)
    with BuildSketch(Plane(origin=(0, 31, 0), x_dir=(1, 0, 0), z_dir=(0, 1, 0))):
        Polygon((4.441941487, 0), (11.658819852, -12.5), (26.092576582, -12.5), (33.309454947, 0), (26.092576582, 12.5), (11.658819852, 12.5), align=None)
    extrude(amount=-CUT_EXTRUDE3_DEPTH, mode=Mode.SUBTRACT)

    # Sketch6 → Cut-Extrude4 (cut, up to next)
    with BuildSketch(Plane(origin=(0, 31, 0), x_dir=(1, 0, 0), z_dir=(0, 1, 0)), mode=Mode.PRIVATE) as cut_extrude4_sk1:
        with Locations((81.518316837, 0)):
            Circle(SKETCH6_R)
    cut_extrude4_tool1 = extrude(cut_extrude4_sk1.sketch, amount=-CUT_EXTRUDE4_REACH, mode=Mode.PRIVATE) & part.part
    add(cut_extrude4_tool1.solids().sort_by_distance((81.518317, 31, 0))[0], mode=Mode.SUBTRACT)


solid = part.part
